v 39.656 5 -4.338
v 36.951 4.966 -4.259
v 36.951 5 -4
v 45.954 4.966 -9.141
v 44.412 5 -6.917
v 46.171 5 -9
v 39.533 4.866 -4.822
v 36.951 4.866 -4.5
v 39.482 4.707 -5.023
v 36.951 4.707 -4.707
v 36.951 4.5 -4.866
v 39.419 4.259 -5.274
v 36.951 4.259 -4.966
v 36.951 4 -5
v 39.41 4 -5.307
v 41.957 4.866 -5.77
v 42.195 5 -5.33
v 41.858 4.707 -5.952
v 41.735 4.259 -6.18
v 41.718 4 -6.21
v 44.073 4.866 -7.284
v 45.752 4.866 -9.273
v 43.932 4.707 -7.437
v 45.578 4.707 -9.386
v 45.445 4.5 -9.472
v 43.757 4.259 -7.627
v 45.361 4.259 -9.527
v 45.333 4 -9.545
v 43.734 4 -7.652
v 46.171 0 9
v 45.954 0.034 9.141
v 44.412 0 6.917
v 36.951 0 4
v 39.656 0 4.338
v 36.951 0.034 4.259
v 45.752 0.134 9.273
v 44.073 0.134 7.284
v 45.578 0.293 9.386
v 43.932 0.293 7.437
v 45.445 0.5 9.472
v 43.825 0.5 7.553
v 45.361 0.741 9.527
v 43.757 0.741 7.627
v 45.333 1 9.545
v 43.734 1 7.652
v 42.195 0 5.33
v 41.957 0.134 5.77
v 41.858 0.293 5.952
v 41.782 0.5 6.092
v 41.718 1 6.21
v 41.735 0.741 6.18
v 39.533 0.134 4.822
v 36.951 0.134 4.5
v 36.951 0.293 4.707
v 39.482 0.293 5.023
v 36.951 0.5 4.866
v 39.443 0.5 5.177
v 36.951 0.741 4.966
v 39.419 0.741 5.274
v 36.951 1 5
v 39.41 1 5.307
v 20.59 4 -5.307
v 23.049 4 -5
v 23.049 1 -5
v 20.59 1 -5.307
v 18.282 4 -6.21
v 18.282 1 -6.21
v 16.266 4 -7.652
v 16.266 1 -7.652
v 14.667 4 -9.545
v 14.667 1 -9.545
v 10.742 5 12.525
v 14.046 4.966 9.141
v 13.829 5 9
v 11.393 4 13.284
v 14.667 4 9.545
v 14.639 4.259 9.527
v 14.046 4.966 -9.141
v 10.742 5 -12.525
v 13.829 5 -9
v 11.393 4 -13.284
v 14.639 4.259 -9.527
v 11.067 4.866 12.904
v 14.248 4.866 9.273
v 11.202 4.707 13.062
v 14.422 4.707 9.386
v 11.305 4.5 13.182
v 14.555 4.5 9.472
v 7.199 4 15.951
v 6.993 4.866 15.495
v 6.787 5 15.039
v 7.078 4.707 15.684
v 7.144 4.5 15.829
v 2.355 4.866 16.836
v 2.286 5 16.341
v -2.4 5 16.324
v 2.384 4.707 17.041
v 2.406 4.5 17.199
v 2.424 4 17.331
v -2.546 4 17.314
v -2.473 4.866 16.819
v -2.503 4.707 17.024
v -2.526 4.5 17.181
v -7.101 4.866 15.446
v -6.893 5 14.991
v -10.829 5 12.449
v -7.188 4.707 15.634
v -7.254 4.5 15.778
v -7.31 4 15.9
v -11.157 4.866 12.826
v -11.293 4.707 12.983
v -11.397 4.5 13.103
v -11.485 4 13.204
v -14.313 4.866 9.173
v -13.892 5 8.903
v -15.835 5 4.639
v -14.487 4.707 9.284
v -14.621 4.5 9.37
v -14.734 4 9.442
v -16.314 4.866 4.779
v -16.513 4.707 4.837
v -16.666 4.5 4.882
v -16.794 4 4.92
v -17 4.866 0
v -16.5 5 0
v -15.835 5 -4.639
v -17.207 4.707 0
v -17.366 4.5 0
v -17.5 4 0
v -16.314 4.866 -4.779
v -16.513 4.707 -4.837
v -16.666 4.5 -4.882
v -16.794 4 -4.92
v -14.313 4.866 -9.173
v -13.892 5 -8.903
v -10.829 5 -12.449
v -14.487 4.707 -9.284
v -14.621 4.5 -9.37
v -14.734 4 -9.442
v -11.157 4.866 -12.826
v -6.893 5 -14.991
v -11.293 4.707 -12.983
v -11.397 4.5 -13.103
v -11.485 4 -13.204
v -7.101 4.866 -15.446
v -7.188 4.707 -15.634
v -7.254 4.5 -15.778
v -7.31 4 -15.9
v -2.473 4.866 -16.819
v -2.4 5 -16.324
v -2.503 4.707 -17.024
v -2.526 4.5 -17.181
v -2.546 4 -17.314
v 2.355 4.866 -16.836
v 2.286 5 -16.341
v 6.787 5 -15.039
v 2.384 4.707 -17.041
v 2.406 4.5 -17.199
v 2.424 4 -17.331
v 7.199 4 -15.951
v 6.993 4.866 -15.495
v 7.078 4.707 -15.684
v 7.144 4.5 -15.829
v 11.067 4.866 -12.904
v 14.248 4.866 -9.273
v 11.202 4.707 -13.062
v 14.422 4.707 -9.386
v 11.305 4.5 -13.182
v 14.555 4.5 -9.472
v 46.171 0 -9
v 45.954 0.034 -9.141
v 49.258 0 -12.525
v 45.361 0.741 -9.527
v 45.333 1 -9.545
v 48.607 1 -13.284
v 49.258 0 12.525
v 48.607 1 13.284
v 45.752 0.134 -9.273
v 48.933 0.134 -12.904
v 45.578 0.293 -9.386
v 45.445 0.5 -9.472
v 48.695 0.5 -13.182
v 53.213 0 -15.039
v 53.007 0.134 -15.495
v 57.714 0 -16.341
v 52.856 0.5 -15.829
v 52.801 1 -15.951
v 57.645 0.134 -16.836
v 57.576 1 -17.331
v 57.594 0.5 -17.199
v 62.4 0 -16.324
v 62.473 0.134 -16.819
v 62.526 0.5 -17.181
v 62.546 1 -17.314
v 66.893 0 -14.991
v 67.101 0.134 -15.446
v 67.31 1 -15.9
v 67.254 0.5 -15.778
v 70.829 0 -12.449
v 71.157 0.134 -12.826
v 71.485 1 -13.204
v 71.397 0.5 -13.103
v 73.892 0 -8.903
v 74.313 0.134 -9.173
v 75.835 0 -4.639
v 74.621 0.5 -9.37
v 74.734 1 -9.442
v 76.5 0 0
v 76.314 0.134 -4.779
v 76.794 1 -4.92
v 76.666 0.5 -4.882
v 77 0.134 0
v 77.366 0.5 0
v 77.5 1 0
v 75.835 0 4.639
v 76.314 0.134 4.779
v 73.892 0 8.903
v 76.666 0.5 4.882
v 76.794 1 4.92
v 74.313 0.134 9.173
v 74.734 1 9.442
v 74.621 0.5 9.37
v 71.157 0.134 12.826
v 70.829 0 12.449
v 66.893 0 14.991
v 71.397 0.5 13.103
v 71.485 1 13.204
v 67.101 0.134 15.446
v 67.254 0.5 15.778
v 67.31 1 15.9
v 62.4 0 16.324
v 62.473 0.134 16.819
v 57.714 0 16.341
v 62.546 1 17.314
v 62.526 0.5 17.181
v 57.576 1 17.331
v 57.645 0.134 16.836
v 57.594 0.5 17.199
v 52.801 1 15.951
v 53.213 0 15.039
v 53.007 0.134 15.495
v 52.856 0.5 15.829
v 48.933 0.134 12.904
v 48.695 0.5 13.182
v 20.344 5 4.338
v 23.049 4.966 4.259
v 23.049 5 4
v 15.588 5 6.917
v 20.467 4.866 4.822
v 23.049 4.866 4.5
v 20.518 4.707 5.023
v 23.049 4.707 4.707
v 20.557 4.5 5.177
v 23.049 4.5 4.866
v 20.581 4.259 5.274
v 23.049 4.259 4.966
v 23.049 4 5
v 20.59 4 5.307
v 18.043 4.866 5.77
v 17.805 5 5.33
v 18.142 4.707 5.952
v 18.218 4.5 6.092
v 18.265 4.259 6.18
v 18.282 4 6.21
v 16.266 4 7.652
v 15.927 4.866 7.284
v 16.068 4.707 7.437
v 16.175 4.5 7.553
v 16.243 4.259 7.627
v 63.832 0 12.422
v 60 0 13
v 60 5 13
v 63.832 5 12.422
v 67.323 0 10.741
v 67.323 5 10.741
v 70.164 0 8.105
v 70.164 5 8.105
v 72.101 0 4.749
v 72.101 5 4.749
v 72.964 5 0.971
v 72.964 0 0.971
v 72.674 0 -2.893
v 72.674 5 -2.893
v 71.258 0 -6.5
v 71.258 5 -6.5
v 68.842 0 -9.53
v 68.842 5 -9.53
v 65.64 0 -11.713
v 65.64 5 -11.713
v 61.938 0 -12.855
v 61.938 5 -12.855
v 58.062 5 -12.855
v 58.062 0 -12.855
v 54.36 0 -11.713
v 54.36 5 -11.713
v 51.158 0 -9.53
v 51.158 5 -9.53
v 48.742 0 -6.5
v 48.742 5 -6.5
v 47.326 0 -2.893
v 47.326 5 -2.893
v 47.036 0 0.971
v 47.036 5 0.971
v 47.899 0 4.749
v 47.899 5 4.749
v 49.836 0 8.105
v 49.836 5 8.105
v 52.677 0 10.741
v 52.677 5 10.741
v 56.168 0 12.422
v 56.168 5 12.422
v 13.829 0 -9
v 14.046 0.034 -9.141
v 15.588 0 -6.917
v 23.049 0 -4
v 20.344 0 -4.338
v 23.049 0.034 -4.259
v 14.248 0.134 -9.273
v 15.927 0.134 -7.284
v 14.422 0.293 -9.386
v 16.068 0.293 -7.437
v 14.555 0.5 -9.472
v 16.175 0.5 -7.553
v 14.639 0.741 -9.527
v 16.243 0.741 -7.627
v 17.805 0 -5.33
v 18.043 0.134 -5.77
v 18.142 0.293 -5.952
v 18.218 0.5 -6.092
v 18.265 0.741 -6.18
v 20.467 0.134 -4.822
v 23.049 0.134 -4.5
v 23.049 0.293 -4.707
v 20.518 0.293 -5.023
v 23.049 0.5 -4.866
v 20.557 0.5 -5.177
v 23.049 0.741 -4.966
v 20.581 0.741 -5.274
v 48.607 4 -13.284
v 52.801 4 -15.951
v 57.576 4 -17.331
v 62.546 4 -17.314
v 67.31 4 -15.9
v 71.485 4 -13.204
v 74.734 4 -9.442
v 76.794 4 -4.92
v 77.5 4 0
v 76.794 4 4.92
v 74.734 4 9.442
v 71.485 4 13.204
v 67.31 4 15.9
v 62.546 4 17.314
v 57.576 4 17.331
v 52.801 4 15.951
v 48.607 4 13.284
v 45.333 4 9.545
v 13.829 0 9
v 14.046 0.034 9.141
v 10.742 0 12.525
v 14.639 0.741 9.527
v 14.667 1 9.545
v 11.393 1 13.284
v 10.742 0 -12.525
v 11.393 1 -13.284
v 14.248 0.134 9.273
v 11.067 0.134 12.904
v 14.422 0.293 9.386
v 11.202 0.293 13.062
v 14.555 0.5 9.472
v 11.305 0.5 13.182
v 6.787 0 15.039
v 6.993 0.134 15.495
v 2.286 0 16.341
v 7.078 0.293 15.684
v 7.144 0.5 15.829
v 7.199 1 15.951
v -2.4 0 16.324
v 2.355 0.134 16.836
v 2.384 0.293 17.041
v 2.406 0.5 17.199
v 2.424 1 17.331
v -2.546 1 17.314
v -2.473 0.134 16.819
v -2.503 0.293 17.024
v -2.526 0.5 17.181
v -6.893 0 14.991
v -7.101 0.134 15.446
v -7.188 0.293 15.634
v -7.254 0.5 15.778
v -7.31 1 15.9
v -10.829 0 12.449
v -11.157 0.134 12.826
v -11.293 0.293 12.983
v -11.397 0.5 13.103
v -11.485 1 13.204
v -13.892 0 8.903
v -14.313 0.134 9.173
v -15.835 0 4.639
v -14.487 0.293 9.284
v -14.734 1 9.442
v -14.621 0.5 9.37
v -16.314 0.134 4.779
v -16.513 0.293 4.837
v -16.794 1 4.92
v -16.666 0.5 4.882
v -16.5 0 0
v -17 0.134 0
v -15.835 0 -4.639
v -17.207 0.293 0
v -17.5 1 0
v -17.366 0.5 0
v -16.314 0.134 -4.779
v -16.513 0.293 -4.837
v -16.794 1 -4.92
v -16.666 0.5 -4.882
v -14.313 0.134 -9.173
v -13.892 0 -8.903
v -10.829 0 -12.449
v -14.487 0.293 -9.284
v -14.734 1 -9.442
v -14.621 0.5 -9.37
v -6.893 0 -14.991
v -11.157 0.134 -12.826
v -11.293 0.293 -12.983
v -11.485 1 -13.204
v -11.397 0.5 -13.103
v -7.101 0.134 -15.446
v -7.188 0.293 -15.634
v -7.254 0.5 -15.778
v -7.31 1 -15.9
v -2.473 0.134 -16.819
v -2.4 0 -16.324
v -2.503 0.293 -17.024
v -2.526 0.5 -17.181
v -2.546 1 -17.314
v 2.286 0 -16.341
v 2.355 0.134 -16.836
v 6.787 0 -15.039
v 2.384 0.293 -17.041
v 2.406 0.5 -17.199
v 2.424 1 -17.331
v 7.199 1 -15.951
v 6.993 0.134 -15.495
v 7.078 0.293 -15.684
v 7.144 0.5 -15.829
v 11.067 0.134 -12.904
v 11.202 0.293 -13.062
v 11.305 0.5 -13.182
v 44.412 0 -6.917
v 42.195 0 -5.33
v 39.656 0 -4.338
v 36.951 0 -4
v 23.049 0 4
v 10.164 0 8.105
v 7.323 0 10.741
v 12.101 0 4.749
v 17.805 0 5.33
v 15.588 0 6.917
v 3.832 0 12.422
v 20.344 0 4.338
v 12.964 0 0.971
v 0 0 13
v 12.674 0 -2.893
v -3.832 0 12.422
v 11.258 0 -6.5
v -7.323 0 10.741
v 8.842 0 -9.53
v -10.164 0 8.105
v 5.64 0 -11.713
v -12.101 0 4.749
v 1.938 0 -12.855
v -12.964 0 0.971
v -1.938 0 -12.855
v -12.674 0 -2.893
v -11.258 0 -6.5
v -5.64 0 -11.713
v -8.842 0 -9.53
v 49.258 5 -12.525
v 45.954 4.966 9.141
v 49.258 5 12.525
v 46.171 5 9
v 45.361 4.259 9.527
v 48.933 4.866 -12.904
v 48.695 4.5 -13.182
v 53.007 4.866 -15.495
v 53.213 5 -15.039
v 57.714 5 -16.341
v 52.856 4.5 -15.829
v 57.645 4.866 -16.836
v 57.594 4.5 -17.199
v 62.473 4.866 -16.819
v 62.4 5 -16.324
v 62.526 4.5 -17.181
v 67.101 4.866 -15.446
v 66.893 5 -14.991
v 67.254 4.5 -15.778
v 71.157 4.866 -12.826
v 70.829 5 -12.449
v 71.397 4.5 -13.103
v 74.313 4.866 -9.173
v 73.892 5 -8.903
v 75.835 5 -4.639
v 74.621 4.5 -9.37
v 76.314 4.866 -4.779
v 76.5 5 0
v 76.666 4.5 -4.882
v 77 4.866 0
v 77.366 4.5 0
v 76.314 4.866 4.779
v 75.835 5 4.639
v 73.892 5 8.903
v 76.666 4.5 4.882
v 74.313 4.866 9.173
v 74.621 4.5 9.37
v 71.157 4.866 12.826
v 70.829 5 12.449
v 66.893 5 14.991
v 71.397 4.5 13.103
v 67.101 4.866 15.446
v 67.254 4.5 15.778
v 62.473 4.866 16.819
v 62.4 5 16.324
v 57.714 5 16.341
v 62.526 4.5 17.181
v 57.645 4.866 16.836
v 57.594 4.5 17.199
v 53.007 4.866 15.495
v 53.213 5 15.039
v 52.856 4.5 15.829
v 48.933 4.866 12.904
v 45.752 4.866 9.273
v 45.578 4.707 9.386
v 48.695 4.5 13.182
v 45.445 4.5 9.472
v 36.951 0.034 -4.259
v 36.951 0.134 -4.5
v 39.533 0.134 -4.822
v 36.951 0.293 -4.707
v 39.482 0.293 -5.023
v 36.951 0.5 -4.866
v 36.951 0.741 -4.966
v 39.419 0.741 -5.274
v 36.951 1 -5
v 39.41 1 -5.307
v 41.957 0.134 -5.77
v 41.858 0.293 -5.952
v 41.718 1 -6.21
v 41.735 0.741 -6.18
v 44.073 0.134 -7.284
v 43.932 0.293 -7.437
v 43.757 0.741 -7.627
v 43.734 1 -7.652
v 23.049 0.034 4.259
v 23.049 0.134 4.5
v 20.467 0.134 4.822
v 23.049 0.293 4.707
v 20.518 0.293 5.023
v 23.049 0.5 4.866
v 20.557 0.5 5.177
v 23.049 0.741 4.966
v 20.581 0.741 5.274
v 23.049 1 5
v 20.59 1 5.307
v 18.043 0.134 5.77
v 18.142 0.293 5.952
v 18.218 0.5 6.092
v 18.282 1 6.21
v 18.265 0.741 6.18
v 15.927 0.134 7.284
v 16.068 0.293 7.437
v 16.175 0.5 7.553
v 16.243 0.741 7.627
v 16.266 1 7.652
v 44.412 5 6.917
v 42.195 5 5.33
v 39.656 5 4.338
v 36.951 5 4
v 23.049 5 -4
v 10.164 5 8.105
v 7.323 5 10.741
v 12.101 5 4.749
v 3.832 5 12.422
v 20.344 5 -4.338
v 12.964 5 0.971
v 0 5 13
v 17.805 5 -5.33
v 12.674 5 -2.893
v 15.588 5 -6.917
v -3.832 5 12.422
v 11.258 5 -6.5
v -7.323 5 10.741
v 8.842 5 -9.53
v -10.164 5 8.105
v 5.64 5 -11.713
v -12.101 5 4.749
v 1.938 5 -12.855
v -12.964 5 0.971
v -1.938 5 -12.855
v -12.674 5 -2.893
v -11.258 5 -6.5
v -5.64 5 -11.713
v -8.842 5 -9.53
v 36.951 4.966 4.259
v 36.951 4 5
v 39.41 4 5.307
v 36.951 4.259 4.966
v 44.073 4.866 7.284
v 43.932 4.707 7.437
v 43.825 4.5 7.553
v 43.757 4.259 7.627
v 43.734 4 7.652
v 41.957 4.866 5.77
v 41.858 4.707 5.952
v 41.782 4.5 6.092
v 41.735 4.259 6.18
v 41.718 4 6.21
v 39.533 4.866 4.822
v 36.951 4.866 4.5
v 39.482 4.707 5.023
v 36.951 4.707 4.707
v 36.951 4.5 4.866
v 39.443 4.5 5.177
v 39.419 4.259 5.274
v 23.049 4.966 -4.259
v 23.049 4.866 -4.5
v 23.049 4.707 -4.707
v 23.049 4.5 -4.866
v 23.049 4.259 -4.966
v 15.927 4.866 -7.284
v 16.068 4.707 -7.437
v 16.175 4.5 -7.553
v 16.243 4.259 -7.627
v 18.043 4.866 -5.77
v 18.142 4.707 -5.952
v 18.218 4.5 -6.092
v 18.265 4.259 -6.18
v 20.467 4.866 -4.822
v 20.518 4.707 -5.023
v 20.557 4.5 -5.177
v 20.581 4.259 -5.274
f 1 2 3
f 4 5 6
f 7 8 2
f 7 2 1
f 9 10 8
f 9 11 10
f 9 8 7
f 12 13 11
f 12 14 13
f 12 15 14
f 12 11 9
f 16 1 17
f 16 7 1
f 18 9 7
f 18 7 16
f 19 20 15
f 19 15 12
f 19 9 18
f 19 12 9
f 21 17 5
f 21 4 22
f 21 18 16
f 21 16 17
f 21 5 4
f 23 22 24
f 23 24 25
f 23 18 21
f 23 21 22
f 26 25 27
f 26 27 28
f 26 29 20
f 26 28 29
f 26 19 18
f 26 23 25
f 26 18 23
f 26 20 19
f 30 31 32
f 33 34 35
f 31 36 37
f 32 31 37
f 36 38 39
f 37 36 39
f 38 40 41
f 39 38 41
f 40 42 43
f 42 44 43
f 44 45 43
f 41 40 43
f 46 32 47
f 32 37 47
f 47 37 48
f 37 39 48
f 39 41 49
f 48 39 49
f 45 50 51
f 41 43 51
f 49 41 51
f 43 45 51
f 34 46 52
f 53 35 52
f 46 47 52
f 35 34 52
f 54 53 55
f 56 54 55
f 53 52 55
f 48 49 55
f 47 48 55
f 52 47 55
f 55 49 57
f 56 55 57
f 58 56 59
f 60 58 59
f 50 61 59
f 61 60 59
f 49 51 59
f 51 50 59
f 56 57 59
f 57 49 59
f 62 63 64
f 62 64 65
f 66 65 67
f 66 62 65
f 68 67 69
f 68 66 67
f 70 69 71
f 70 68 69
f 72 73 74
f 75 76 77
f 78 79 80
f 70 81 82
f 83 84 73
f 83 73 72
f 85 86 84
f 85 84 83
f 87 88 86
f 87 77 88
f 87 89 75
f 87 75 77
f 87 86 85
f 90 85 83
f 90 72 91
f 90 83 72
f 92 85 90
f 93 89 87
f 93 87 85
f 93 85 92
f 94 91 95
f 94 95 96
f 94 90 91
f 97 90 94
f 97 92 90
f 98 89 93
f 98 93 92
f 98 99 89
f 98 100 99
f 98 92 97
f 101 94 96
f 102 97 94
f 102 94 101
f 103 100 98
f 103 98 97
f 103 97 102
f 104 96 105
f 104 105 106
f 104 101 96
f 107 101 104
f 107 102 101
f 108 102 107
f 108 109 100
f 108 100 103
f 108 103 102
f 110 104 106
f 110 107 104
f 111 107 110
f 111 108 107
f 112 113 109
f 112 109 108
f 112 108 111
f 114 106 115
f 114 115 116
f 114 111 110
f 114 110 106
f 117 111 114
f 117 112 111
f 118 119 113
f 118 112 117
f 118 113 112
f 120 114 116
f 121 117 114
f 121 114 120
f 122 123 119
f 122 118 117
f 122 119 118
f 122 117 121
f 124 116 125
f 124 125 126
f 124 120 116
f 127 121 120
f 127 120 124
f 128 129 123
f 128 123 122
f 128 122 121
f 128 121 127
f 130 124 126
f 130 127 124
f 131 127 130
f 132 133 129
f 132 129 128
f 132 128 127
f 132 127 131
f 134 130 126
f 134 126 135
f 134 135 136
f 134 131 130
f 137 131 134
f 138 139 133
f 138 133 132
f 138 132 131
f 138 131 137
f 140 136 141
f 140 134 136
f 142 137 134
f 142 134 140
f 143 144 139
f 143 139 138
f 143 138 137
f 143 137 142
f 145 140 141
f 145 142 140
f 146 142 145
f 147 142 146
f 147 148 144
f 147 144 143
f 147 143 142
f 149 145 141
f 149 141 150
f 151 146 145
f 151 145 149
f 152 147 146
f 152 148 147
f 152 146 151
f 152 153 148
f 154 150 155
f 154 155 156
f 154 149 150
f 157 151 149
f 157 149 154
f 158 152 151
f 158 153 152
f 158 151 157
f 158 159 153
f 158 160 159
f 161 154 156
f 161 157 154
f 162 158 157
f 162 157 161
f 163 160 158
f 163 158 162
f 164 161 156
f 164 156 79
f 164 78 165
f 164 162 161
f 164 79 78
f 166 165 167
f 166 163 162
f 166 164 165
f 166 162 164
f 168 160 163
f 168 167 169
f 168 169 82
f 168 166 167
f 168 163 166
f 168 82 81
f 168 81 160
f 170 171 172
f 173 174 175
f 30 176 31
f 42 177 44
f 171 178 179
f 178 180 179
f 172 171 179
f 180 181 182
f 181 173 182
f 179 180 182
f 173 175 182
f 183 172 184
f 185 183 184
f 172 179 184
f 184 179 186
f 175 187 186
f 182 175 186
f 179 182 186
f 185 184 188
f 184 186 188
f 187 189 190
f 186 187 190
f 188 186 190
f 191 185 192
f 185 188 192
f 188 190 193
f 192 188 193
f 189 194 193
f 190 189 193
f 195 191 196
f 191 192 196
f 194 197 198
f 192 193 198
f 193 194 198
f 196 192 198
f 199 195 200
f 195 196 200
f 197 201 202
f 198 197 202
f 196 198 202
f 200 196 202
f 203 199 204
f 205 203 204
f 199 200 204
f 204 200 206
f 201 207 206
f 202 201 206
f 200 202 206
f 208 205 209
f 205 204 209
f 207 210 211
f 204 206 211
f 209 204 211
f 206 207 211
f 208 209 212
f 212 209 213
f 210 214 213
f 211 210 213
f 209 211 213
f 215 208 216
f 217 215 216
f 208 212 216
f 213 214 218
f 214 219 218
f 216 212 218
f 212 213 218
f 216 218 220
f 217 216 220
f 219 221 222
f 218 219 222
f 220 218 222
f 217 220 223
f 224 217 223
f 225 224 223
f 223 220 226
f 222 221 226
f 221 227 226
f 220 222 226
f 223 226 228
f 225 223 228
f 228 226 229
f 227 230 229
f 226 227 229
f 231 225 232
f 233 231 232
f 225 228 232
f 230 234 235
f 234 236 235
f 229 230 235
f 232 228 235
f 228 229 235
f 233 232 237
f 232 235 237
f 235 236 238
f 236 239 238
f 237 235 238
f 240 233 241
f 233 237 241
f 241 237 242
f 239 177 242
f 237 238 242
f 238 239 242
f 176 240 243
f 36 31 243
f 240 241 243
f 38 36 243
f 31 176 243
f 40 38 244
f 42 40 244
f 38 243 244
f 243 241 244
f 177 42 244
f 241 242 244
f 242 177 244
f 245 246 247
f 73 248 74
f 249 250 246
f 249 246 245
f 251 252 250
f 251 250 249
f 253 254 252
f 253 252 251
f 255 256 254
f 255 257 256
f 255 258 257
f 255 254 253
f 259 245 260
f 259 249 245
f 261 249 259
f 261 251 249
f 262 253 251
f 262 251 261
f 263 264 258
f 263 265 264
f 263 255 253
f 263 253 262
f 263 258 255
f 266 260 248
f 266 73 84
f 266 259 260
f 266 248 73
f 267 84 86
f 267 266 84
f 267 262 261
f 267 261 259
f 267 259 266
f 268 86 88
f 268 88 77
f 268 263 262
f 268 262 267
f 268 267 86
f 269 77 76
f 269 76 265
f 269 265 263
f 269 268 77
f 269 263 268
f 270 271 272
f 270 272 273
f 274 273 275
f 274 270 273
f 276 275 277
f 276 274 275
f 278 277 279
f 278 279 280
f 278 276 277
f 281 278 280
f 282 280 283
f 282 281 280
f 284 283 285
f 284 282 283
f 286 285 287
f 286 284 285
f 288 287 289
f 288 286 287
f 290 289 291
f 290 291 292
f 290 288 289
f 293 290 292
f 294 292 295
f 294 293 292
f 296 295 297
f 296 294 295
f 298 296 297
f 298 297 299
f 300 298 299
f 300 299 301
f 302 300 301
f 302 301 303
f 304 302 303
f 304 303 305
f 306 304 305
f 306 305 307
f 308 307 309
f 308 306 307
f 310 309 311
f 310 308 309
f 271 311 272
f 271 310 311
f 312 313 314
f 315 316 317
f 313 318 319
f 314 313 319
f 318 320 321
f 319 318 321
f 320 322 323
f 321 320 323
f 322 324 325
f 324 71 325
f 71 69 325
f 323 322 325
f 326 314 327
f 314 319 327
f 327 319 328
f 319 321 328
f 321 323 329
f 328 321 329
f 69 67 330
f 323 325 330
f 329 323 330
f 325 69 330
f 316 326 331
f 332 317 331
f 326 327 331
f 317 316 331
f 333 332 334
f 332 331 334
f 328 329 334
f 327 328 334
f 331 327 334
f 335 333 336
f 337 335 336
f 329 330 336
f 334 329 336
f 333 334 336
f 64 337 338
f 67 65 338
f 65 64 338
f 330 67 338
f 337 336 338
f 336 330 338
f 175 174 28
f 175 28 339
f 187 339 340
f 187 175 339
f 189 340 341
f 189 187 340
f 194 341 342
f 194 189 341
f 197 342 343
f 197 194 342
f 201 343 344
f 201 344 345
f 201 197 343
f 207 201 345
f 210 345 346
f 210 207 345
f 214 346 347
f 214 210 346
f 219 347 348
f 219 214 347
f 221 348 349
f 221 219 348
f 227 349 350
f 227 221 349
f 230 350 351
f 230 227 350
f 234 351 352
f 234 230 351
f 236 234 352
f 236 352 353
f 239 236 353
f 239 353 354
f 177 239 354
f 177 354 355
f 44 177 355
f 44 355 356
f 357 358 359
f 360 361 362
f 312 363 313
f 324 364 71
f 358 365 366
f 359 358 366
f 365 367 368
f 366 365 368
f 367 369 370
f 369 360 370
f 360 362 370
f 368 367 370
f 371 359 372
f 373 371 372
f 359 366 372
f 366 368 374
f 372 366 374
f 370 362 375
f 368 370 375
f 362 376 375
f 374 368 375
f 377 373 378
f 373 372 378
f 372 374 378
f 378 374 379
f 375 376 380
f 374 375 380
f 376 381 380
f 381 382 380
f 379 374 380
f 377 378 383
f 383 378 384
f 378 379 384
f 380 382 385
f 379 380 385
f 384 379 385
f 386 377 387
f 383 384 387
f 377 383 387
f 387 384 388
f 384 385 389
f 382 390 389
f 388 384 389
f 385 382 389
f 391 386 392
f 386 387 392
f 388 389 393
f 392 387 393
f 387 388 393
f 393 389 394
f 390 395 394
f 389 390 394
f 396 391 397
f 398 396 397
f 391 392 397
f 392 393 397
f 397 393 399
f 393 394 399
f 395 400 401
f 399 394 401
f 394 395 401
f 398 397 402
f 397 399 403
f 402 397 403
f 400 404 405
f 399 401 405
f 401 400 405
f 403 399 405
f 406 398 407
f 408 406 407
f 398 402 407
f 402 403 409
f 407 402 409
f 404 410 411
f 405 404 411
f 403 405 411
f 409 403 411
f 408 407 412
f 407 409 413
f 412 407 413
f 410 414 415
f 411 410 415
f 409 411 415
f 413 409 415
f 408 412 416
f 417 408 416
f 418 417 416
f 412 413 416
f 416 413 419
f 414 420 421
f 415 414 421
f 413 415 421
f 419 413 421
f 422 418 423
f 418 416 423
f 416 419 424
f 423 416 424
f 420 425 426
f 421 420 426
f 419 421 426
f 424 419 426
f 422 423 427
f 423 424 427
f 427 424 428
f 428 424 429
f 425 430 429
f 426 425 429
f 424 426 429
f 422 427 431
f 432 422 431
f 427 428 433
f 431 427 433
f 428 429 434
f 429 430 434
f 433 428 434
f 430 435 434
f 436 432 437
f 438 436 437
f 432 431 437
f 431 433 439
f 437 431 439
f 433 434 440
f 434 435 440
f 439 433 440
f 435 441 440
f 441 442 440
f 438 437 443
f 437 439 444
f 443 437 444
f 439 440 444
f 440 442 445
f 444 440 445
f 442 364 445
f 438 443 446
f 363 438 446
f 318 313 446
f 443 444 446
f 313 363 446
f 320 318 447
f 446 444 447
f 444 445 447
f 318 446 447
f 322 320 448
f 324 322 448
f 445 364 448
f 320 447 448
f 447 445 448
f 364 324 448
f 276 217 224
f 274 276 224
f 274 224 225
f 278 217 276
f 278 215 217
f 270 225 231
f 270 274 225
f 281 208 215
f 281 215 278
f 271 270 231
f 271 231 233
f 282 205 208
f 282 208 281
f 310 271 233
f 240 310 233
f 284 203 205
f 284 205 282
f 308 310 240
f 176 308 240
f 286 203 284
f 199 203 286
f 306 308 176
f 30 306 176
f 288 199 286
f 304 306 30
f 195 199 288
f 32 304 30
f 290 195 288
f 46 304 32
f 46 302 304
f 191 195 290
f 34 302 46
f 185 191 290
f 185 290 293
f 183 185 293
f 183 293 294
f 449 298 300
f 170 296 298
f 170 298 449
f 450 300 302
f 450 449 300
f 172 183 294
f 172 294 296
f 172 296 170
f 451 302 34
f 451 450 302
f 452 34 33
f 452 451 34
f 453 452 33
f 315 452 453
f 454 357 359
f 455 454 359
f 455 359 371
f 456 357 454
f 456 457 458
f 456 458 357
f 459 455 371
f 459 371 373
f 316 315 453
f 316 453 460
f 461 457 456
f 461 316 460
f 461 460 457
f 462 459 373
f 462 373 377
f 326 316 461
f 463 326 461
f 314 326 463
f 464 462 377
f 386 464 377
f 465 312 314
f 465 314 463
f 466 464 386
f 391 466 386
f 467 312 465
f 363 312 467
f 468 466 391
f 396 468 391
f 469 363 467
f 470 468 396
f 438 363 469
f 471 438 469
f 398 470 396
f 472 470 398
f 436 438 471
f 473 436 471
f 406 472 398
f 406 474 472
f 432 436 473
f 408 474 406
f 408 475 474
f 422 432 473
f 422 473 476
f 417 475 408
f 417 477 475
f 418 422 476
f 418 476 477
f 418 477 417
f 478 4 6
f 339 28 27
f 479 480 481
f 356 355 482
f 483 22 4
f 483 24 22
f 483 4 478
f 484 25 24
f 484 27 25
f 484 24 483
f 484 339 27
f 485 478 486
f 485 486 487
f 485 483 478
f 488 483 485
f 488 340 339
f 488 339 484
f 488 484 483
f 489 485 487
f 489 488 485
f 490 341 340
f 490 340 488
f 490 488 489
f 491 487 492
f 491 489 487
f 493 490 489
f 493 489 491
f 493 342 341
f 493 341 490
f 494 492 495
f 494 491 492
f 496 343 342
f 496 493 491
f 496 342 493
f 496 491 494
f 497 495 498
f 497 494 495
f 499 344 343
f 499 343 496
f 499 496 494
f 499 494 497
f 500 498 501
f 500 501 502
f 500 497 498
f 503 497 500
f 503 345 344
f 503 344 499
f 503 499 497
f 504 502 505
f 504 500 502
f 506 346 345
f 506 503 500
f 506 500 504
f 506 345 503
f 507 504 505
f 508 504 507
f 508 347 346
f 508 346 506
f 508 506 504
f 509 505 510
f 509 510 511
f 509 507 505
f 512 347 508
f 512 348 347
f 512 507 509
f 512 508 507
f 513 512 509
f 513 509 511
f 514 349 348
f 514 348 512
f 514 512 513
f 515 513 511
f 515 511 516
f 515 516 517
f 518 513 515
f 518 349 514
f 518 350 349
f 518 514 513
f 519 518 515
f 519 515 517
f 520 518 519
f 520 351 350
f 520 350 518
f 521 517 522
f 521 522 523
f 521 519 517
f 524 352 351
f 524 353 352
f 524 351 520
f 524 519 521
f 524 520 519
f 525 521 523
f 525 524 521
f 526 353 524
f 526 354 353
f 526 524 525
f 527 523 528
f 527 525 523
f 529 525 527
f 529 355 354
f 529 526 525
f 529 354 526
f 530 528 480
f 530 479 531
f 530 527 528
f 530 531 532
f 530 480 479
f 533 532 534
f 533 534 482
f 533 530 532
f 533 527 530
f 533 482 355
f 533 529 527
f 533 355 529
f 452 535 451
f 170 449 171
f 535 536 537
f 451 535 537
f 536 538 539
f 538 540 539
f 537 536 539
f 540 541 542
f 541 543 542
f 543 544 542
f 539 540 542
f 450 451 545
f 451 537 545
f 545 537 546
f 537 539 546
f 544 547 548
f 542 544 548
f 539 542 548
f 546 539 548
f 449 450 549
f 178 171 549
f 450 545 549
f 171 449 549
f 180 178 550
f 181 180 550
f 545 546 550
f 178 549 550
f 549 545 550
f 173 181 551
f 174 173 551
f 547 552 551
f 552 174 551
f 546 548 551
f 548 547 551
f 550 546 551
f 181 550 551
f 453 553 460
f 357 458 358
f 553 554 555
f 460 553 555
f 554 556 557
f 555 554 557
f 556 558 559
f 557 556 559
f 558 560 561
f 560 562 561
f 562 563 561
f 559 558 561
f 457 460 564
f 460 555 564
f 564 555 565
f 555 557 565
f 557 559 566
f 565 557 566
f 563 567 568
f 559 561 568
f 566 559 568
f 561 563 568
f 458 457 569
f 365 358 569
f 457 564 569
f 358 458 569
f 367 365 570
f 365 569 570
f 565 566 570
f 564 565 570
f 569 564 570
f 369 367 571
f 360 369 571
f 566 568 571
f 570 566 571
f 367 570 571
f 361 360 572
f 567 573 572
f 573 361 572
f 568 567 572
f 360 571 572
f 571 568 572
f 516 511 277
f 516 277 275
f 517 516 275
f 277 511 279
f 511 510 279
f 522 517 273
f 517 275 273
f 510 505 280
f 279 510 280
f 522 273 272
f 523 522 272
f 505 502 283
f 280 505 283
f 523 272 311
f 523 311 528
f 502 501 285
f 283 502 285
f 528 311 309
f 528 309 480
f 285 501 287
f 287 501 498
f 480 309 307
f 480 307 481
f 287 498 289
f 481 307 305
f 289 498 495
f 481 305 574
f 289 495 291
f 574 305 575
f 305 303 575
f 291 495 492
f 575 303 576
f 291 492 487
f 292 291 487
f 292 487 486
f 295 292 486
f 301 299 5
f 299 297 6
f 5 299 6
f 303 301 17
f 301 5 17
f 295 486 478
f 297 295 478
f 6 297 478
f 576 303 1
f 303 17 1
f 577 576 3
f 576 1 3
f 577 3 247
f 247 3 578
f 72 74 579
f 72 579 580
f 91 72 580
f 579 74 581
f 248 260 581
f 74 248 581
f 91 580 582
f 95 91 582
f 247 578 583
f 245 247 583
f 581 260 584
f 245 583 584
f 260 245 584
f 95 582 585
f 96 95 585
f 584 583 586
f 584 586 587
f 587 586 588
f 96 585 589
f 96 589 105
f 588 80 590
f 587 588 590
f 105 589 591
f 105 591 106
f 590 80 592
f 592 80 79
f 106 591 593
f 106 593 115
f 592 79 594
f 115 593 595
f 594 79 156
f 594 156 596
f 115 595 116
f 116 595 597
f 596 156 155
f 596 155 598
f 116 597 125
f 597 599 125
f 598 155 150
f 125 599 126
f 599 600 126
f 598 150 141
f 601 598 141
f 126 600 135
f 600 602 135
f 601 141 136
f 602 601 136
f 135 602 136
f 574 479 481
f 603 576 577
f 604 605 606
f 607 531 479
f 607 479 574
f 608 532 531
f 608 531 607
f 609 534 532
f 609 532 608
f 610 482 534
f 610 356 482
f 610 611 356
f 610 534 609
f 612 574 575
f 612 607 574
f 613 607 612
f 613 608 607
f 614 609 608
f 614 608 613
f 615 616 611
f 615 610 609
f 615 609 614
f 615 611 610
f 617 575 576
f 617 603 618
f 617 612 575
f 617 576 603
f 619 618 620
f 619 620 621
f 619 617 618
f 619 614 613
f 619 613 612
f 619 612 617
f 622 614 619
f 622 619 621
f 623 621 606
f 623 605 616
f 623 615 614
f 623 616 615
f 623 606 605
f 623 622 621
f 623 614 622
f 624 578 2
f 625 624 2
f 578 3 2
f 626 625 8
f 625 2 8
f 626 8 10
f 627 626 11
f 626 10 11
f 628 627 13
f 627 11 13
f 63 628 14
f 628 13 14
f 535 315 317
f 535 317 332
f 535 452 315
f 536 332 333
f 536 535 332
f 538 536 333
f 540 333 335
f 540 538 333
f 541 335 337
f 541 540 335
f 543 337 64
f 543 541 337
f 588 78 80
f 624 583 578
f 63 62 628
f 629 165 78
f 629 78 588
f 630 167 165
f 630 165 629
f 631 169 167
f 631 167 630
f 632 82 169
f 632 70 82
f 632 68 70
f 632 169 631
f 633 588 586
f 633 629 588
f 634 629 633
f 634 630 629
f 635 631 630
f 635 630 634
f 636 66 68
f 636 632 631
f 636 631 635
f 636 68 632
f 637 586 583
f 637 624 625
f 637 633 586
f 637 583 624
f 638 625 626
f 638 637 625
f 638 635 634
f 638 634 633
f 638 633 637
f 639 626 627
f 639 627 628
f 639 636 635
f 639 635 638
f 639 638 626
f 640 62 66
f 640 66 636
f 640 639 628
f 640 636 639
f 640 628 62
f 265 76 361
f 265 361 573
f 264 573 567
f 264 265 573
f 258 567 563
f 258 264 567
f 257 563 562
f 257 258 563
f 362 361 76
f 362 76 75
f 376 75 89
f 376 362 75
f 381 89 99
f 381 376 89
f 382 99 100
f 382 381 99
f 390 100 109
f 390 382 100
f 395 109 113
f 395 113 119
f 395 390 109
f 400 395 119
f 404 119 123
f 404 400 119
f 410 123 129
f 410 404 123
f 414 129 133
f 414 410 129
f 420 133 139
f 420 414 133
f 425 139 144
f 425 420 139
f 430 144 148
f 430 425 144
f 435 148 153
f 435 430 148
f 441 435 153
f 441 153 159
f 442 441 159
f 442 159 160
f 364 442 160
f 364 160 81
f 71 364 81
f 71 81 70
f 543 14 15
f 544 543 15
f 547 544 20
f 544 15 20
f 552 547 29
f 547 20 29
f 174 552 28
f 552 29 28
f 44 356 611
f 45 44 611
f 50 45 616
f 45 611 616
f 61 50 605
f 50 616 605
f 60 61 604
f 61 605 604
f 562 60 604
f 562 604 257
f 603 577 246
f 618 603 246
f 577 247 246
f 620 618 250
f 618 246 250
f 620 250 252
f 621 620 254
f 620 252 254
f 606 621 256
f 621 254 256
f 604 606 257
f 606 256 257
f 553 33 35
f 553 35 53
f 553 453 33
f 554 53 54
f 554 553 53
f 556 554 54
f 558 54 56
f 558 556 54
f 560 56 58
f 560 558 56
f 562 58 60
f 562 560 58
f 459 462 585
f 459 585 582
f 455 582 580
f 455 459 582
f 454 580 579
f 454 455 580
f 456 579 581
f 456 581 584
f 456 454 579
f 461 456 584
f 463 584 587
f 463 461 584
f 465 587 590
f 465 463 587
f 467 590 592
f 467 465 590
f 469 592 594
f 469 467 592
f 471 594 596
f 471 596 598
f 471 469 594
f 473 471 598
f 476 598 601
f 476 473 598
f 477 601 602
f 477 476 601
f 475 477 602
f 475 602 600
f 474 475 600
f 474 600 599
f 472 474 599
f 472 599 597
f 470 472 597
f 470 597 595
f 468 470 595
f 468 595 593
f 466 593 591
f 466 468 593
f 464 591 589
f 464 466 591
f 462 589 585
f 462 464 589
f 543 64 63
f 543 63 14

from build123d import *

# Parameters (mm, degrees)
SKETCH1_R           = 13
BOSS_EXTRUDE1_DEPTH = 5
FILLET1_R           = 10
FILLET2_R           = 1


with BuildPart() as part:
    # Sketch1 → Boss-Extrude1 (new body)
    with BuildSketch(Plane(origin=(0, 0, 0), x_dir=(1, 0, 0), z_dir=(0, 1, 0))):
        with BuildLine():
            Line((16.770509831, 5), (43.229490169, 5))
            ThreePointArc((43.229490169, 5), (77.5, 0), (43.229490169, -5))
            Line((43.229490169, -5), (16.770509831, -5))
            ThreePointArc((16.770509831, -5), (-17.5, 0), (16.770509831, 5))
        make_face()
        with Locations(Location((0, 0, 0), (0, 0, 270))):
            Circle(SKETCH1_R, mode=Mode.SUBTRACT)
        with Locations(Location((60, 0, 0), (0, 0, 270))):
            Circle(SKETCH1_R, mode=Mode.SUBTRACT)
    extrude(amount=BOSS_EXTRUDE1_DEPTH)

    # Fillet1
    fillet1_edges = [part.edges().sort_by_distance(p)[0] for p in [
        (16.770509831, 2.5, -5),
        (43.229490169, 2.5, -5),
        (43.229490169, 2.5, 5),
        (16.770509831, 2.5, 5),
    ]]
    fillet(fillet1_edges, radius=FILLET1_R)

    # Fillet2
    fillet2_edges = [part.edges().sort_by_distance(p)[0] for p in [
        (77.5, 0, 0),
        (77.5, 5, 0),
        (30, 0, 5),
        (30, 5, 5),
        (-17.5, 0, 0),
        (-17.5, 5, 0),
        (30, 0, -5),
        (30, 5, -5),
        (41.718451803, 0, 6.20950927),
        (41.718451803, 5, 6.20950927),
        (18.281548197, 0, 6.20950927),
        (18.281548197, 5, 6.20950927),
        (41.718451803, 0, -6.20950927),
        (41.718451803, 5, -6.20950927),
        (18.281548197, 0, -6.20950927),
        (18.281548197, 5, -6.20950927),
    ]]
    fillet(fillet2_edges, radius=FILLET2_R)


solid = part.part
